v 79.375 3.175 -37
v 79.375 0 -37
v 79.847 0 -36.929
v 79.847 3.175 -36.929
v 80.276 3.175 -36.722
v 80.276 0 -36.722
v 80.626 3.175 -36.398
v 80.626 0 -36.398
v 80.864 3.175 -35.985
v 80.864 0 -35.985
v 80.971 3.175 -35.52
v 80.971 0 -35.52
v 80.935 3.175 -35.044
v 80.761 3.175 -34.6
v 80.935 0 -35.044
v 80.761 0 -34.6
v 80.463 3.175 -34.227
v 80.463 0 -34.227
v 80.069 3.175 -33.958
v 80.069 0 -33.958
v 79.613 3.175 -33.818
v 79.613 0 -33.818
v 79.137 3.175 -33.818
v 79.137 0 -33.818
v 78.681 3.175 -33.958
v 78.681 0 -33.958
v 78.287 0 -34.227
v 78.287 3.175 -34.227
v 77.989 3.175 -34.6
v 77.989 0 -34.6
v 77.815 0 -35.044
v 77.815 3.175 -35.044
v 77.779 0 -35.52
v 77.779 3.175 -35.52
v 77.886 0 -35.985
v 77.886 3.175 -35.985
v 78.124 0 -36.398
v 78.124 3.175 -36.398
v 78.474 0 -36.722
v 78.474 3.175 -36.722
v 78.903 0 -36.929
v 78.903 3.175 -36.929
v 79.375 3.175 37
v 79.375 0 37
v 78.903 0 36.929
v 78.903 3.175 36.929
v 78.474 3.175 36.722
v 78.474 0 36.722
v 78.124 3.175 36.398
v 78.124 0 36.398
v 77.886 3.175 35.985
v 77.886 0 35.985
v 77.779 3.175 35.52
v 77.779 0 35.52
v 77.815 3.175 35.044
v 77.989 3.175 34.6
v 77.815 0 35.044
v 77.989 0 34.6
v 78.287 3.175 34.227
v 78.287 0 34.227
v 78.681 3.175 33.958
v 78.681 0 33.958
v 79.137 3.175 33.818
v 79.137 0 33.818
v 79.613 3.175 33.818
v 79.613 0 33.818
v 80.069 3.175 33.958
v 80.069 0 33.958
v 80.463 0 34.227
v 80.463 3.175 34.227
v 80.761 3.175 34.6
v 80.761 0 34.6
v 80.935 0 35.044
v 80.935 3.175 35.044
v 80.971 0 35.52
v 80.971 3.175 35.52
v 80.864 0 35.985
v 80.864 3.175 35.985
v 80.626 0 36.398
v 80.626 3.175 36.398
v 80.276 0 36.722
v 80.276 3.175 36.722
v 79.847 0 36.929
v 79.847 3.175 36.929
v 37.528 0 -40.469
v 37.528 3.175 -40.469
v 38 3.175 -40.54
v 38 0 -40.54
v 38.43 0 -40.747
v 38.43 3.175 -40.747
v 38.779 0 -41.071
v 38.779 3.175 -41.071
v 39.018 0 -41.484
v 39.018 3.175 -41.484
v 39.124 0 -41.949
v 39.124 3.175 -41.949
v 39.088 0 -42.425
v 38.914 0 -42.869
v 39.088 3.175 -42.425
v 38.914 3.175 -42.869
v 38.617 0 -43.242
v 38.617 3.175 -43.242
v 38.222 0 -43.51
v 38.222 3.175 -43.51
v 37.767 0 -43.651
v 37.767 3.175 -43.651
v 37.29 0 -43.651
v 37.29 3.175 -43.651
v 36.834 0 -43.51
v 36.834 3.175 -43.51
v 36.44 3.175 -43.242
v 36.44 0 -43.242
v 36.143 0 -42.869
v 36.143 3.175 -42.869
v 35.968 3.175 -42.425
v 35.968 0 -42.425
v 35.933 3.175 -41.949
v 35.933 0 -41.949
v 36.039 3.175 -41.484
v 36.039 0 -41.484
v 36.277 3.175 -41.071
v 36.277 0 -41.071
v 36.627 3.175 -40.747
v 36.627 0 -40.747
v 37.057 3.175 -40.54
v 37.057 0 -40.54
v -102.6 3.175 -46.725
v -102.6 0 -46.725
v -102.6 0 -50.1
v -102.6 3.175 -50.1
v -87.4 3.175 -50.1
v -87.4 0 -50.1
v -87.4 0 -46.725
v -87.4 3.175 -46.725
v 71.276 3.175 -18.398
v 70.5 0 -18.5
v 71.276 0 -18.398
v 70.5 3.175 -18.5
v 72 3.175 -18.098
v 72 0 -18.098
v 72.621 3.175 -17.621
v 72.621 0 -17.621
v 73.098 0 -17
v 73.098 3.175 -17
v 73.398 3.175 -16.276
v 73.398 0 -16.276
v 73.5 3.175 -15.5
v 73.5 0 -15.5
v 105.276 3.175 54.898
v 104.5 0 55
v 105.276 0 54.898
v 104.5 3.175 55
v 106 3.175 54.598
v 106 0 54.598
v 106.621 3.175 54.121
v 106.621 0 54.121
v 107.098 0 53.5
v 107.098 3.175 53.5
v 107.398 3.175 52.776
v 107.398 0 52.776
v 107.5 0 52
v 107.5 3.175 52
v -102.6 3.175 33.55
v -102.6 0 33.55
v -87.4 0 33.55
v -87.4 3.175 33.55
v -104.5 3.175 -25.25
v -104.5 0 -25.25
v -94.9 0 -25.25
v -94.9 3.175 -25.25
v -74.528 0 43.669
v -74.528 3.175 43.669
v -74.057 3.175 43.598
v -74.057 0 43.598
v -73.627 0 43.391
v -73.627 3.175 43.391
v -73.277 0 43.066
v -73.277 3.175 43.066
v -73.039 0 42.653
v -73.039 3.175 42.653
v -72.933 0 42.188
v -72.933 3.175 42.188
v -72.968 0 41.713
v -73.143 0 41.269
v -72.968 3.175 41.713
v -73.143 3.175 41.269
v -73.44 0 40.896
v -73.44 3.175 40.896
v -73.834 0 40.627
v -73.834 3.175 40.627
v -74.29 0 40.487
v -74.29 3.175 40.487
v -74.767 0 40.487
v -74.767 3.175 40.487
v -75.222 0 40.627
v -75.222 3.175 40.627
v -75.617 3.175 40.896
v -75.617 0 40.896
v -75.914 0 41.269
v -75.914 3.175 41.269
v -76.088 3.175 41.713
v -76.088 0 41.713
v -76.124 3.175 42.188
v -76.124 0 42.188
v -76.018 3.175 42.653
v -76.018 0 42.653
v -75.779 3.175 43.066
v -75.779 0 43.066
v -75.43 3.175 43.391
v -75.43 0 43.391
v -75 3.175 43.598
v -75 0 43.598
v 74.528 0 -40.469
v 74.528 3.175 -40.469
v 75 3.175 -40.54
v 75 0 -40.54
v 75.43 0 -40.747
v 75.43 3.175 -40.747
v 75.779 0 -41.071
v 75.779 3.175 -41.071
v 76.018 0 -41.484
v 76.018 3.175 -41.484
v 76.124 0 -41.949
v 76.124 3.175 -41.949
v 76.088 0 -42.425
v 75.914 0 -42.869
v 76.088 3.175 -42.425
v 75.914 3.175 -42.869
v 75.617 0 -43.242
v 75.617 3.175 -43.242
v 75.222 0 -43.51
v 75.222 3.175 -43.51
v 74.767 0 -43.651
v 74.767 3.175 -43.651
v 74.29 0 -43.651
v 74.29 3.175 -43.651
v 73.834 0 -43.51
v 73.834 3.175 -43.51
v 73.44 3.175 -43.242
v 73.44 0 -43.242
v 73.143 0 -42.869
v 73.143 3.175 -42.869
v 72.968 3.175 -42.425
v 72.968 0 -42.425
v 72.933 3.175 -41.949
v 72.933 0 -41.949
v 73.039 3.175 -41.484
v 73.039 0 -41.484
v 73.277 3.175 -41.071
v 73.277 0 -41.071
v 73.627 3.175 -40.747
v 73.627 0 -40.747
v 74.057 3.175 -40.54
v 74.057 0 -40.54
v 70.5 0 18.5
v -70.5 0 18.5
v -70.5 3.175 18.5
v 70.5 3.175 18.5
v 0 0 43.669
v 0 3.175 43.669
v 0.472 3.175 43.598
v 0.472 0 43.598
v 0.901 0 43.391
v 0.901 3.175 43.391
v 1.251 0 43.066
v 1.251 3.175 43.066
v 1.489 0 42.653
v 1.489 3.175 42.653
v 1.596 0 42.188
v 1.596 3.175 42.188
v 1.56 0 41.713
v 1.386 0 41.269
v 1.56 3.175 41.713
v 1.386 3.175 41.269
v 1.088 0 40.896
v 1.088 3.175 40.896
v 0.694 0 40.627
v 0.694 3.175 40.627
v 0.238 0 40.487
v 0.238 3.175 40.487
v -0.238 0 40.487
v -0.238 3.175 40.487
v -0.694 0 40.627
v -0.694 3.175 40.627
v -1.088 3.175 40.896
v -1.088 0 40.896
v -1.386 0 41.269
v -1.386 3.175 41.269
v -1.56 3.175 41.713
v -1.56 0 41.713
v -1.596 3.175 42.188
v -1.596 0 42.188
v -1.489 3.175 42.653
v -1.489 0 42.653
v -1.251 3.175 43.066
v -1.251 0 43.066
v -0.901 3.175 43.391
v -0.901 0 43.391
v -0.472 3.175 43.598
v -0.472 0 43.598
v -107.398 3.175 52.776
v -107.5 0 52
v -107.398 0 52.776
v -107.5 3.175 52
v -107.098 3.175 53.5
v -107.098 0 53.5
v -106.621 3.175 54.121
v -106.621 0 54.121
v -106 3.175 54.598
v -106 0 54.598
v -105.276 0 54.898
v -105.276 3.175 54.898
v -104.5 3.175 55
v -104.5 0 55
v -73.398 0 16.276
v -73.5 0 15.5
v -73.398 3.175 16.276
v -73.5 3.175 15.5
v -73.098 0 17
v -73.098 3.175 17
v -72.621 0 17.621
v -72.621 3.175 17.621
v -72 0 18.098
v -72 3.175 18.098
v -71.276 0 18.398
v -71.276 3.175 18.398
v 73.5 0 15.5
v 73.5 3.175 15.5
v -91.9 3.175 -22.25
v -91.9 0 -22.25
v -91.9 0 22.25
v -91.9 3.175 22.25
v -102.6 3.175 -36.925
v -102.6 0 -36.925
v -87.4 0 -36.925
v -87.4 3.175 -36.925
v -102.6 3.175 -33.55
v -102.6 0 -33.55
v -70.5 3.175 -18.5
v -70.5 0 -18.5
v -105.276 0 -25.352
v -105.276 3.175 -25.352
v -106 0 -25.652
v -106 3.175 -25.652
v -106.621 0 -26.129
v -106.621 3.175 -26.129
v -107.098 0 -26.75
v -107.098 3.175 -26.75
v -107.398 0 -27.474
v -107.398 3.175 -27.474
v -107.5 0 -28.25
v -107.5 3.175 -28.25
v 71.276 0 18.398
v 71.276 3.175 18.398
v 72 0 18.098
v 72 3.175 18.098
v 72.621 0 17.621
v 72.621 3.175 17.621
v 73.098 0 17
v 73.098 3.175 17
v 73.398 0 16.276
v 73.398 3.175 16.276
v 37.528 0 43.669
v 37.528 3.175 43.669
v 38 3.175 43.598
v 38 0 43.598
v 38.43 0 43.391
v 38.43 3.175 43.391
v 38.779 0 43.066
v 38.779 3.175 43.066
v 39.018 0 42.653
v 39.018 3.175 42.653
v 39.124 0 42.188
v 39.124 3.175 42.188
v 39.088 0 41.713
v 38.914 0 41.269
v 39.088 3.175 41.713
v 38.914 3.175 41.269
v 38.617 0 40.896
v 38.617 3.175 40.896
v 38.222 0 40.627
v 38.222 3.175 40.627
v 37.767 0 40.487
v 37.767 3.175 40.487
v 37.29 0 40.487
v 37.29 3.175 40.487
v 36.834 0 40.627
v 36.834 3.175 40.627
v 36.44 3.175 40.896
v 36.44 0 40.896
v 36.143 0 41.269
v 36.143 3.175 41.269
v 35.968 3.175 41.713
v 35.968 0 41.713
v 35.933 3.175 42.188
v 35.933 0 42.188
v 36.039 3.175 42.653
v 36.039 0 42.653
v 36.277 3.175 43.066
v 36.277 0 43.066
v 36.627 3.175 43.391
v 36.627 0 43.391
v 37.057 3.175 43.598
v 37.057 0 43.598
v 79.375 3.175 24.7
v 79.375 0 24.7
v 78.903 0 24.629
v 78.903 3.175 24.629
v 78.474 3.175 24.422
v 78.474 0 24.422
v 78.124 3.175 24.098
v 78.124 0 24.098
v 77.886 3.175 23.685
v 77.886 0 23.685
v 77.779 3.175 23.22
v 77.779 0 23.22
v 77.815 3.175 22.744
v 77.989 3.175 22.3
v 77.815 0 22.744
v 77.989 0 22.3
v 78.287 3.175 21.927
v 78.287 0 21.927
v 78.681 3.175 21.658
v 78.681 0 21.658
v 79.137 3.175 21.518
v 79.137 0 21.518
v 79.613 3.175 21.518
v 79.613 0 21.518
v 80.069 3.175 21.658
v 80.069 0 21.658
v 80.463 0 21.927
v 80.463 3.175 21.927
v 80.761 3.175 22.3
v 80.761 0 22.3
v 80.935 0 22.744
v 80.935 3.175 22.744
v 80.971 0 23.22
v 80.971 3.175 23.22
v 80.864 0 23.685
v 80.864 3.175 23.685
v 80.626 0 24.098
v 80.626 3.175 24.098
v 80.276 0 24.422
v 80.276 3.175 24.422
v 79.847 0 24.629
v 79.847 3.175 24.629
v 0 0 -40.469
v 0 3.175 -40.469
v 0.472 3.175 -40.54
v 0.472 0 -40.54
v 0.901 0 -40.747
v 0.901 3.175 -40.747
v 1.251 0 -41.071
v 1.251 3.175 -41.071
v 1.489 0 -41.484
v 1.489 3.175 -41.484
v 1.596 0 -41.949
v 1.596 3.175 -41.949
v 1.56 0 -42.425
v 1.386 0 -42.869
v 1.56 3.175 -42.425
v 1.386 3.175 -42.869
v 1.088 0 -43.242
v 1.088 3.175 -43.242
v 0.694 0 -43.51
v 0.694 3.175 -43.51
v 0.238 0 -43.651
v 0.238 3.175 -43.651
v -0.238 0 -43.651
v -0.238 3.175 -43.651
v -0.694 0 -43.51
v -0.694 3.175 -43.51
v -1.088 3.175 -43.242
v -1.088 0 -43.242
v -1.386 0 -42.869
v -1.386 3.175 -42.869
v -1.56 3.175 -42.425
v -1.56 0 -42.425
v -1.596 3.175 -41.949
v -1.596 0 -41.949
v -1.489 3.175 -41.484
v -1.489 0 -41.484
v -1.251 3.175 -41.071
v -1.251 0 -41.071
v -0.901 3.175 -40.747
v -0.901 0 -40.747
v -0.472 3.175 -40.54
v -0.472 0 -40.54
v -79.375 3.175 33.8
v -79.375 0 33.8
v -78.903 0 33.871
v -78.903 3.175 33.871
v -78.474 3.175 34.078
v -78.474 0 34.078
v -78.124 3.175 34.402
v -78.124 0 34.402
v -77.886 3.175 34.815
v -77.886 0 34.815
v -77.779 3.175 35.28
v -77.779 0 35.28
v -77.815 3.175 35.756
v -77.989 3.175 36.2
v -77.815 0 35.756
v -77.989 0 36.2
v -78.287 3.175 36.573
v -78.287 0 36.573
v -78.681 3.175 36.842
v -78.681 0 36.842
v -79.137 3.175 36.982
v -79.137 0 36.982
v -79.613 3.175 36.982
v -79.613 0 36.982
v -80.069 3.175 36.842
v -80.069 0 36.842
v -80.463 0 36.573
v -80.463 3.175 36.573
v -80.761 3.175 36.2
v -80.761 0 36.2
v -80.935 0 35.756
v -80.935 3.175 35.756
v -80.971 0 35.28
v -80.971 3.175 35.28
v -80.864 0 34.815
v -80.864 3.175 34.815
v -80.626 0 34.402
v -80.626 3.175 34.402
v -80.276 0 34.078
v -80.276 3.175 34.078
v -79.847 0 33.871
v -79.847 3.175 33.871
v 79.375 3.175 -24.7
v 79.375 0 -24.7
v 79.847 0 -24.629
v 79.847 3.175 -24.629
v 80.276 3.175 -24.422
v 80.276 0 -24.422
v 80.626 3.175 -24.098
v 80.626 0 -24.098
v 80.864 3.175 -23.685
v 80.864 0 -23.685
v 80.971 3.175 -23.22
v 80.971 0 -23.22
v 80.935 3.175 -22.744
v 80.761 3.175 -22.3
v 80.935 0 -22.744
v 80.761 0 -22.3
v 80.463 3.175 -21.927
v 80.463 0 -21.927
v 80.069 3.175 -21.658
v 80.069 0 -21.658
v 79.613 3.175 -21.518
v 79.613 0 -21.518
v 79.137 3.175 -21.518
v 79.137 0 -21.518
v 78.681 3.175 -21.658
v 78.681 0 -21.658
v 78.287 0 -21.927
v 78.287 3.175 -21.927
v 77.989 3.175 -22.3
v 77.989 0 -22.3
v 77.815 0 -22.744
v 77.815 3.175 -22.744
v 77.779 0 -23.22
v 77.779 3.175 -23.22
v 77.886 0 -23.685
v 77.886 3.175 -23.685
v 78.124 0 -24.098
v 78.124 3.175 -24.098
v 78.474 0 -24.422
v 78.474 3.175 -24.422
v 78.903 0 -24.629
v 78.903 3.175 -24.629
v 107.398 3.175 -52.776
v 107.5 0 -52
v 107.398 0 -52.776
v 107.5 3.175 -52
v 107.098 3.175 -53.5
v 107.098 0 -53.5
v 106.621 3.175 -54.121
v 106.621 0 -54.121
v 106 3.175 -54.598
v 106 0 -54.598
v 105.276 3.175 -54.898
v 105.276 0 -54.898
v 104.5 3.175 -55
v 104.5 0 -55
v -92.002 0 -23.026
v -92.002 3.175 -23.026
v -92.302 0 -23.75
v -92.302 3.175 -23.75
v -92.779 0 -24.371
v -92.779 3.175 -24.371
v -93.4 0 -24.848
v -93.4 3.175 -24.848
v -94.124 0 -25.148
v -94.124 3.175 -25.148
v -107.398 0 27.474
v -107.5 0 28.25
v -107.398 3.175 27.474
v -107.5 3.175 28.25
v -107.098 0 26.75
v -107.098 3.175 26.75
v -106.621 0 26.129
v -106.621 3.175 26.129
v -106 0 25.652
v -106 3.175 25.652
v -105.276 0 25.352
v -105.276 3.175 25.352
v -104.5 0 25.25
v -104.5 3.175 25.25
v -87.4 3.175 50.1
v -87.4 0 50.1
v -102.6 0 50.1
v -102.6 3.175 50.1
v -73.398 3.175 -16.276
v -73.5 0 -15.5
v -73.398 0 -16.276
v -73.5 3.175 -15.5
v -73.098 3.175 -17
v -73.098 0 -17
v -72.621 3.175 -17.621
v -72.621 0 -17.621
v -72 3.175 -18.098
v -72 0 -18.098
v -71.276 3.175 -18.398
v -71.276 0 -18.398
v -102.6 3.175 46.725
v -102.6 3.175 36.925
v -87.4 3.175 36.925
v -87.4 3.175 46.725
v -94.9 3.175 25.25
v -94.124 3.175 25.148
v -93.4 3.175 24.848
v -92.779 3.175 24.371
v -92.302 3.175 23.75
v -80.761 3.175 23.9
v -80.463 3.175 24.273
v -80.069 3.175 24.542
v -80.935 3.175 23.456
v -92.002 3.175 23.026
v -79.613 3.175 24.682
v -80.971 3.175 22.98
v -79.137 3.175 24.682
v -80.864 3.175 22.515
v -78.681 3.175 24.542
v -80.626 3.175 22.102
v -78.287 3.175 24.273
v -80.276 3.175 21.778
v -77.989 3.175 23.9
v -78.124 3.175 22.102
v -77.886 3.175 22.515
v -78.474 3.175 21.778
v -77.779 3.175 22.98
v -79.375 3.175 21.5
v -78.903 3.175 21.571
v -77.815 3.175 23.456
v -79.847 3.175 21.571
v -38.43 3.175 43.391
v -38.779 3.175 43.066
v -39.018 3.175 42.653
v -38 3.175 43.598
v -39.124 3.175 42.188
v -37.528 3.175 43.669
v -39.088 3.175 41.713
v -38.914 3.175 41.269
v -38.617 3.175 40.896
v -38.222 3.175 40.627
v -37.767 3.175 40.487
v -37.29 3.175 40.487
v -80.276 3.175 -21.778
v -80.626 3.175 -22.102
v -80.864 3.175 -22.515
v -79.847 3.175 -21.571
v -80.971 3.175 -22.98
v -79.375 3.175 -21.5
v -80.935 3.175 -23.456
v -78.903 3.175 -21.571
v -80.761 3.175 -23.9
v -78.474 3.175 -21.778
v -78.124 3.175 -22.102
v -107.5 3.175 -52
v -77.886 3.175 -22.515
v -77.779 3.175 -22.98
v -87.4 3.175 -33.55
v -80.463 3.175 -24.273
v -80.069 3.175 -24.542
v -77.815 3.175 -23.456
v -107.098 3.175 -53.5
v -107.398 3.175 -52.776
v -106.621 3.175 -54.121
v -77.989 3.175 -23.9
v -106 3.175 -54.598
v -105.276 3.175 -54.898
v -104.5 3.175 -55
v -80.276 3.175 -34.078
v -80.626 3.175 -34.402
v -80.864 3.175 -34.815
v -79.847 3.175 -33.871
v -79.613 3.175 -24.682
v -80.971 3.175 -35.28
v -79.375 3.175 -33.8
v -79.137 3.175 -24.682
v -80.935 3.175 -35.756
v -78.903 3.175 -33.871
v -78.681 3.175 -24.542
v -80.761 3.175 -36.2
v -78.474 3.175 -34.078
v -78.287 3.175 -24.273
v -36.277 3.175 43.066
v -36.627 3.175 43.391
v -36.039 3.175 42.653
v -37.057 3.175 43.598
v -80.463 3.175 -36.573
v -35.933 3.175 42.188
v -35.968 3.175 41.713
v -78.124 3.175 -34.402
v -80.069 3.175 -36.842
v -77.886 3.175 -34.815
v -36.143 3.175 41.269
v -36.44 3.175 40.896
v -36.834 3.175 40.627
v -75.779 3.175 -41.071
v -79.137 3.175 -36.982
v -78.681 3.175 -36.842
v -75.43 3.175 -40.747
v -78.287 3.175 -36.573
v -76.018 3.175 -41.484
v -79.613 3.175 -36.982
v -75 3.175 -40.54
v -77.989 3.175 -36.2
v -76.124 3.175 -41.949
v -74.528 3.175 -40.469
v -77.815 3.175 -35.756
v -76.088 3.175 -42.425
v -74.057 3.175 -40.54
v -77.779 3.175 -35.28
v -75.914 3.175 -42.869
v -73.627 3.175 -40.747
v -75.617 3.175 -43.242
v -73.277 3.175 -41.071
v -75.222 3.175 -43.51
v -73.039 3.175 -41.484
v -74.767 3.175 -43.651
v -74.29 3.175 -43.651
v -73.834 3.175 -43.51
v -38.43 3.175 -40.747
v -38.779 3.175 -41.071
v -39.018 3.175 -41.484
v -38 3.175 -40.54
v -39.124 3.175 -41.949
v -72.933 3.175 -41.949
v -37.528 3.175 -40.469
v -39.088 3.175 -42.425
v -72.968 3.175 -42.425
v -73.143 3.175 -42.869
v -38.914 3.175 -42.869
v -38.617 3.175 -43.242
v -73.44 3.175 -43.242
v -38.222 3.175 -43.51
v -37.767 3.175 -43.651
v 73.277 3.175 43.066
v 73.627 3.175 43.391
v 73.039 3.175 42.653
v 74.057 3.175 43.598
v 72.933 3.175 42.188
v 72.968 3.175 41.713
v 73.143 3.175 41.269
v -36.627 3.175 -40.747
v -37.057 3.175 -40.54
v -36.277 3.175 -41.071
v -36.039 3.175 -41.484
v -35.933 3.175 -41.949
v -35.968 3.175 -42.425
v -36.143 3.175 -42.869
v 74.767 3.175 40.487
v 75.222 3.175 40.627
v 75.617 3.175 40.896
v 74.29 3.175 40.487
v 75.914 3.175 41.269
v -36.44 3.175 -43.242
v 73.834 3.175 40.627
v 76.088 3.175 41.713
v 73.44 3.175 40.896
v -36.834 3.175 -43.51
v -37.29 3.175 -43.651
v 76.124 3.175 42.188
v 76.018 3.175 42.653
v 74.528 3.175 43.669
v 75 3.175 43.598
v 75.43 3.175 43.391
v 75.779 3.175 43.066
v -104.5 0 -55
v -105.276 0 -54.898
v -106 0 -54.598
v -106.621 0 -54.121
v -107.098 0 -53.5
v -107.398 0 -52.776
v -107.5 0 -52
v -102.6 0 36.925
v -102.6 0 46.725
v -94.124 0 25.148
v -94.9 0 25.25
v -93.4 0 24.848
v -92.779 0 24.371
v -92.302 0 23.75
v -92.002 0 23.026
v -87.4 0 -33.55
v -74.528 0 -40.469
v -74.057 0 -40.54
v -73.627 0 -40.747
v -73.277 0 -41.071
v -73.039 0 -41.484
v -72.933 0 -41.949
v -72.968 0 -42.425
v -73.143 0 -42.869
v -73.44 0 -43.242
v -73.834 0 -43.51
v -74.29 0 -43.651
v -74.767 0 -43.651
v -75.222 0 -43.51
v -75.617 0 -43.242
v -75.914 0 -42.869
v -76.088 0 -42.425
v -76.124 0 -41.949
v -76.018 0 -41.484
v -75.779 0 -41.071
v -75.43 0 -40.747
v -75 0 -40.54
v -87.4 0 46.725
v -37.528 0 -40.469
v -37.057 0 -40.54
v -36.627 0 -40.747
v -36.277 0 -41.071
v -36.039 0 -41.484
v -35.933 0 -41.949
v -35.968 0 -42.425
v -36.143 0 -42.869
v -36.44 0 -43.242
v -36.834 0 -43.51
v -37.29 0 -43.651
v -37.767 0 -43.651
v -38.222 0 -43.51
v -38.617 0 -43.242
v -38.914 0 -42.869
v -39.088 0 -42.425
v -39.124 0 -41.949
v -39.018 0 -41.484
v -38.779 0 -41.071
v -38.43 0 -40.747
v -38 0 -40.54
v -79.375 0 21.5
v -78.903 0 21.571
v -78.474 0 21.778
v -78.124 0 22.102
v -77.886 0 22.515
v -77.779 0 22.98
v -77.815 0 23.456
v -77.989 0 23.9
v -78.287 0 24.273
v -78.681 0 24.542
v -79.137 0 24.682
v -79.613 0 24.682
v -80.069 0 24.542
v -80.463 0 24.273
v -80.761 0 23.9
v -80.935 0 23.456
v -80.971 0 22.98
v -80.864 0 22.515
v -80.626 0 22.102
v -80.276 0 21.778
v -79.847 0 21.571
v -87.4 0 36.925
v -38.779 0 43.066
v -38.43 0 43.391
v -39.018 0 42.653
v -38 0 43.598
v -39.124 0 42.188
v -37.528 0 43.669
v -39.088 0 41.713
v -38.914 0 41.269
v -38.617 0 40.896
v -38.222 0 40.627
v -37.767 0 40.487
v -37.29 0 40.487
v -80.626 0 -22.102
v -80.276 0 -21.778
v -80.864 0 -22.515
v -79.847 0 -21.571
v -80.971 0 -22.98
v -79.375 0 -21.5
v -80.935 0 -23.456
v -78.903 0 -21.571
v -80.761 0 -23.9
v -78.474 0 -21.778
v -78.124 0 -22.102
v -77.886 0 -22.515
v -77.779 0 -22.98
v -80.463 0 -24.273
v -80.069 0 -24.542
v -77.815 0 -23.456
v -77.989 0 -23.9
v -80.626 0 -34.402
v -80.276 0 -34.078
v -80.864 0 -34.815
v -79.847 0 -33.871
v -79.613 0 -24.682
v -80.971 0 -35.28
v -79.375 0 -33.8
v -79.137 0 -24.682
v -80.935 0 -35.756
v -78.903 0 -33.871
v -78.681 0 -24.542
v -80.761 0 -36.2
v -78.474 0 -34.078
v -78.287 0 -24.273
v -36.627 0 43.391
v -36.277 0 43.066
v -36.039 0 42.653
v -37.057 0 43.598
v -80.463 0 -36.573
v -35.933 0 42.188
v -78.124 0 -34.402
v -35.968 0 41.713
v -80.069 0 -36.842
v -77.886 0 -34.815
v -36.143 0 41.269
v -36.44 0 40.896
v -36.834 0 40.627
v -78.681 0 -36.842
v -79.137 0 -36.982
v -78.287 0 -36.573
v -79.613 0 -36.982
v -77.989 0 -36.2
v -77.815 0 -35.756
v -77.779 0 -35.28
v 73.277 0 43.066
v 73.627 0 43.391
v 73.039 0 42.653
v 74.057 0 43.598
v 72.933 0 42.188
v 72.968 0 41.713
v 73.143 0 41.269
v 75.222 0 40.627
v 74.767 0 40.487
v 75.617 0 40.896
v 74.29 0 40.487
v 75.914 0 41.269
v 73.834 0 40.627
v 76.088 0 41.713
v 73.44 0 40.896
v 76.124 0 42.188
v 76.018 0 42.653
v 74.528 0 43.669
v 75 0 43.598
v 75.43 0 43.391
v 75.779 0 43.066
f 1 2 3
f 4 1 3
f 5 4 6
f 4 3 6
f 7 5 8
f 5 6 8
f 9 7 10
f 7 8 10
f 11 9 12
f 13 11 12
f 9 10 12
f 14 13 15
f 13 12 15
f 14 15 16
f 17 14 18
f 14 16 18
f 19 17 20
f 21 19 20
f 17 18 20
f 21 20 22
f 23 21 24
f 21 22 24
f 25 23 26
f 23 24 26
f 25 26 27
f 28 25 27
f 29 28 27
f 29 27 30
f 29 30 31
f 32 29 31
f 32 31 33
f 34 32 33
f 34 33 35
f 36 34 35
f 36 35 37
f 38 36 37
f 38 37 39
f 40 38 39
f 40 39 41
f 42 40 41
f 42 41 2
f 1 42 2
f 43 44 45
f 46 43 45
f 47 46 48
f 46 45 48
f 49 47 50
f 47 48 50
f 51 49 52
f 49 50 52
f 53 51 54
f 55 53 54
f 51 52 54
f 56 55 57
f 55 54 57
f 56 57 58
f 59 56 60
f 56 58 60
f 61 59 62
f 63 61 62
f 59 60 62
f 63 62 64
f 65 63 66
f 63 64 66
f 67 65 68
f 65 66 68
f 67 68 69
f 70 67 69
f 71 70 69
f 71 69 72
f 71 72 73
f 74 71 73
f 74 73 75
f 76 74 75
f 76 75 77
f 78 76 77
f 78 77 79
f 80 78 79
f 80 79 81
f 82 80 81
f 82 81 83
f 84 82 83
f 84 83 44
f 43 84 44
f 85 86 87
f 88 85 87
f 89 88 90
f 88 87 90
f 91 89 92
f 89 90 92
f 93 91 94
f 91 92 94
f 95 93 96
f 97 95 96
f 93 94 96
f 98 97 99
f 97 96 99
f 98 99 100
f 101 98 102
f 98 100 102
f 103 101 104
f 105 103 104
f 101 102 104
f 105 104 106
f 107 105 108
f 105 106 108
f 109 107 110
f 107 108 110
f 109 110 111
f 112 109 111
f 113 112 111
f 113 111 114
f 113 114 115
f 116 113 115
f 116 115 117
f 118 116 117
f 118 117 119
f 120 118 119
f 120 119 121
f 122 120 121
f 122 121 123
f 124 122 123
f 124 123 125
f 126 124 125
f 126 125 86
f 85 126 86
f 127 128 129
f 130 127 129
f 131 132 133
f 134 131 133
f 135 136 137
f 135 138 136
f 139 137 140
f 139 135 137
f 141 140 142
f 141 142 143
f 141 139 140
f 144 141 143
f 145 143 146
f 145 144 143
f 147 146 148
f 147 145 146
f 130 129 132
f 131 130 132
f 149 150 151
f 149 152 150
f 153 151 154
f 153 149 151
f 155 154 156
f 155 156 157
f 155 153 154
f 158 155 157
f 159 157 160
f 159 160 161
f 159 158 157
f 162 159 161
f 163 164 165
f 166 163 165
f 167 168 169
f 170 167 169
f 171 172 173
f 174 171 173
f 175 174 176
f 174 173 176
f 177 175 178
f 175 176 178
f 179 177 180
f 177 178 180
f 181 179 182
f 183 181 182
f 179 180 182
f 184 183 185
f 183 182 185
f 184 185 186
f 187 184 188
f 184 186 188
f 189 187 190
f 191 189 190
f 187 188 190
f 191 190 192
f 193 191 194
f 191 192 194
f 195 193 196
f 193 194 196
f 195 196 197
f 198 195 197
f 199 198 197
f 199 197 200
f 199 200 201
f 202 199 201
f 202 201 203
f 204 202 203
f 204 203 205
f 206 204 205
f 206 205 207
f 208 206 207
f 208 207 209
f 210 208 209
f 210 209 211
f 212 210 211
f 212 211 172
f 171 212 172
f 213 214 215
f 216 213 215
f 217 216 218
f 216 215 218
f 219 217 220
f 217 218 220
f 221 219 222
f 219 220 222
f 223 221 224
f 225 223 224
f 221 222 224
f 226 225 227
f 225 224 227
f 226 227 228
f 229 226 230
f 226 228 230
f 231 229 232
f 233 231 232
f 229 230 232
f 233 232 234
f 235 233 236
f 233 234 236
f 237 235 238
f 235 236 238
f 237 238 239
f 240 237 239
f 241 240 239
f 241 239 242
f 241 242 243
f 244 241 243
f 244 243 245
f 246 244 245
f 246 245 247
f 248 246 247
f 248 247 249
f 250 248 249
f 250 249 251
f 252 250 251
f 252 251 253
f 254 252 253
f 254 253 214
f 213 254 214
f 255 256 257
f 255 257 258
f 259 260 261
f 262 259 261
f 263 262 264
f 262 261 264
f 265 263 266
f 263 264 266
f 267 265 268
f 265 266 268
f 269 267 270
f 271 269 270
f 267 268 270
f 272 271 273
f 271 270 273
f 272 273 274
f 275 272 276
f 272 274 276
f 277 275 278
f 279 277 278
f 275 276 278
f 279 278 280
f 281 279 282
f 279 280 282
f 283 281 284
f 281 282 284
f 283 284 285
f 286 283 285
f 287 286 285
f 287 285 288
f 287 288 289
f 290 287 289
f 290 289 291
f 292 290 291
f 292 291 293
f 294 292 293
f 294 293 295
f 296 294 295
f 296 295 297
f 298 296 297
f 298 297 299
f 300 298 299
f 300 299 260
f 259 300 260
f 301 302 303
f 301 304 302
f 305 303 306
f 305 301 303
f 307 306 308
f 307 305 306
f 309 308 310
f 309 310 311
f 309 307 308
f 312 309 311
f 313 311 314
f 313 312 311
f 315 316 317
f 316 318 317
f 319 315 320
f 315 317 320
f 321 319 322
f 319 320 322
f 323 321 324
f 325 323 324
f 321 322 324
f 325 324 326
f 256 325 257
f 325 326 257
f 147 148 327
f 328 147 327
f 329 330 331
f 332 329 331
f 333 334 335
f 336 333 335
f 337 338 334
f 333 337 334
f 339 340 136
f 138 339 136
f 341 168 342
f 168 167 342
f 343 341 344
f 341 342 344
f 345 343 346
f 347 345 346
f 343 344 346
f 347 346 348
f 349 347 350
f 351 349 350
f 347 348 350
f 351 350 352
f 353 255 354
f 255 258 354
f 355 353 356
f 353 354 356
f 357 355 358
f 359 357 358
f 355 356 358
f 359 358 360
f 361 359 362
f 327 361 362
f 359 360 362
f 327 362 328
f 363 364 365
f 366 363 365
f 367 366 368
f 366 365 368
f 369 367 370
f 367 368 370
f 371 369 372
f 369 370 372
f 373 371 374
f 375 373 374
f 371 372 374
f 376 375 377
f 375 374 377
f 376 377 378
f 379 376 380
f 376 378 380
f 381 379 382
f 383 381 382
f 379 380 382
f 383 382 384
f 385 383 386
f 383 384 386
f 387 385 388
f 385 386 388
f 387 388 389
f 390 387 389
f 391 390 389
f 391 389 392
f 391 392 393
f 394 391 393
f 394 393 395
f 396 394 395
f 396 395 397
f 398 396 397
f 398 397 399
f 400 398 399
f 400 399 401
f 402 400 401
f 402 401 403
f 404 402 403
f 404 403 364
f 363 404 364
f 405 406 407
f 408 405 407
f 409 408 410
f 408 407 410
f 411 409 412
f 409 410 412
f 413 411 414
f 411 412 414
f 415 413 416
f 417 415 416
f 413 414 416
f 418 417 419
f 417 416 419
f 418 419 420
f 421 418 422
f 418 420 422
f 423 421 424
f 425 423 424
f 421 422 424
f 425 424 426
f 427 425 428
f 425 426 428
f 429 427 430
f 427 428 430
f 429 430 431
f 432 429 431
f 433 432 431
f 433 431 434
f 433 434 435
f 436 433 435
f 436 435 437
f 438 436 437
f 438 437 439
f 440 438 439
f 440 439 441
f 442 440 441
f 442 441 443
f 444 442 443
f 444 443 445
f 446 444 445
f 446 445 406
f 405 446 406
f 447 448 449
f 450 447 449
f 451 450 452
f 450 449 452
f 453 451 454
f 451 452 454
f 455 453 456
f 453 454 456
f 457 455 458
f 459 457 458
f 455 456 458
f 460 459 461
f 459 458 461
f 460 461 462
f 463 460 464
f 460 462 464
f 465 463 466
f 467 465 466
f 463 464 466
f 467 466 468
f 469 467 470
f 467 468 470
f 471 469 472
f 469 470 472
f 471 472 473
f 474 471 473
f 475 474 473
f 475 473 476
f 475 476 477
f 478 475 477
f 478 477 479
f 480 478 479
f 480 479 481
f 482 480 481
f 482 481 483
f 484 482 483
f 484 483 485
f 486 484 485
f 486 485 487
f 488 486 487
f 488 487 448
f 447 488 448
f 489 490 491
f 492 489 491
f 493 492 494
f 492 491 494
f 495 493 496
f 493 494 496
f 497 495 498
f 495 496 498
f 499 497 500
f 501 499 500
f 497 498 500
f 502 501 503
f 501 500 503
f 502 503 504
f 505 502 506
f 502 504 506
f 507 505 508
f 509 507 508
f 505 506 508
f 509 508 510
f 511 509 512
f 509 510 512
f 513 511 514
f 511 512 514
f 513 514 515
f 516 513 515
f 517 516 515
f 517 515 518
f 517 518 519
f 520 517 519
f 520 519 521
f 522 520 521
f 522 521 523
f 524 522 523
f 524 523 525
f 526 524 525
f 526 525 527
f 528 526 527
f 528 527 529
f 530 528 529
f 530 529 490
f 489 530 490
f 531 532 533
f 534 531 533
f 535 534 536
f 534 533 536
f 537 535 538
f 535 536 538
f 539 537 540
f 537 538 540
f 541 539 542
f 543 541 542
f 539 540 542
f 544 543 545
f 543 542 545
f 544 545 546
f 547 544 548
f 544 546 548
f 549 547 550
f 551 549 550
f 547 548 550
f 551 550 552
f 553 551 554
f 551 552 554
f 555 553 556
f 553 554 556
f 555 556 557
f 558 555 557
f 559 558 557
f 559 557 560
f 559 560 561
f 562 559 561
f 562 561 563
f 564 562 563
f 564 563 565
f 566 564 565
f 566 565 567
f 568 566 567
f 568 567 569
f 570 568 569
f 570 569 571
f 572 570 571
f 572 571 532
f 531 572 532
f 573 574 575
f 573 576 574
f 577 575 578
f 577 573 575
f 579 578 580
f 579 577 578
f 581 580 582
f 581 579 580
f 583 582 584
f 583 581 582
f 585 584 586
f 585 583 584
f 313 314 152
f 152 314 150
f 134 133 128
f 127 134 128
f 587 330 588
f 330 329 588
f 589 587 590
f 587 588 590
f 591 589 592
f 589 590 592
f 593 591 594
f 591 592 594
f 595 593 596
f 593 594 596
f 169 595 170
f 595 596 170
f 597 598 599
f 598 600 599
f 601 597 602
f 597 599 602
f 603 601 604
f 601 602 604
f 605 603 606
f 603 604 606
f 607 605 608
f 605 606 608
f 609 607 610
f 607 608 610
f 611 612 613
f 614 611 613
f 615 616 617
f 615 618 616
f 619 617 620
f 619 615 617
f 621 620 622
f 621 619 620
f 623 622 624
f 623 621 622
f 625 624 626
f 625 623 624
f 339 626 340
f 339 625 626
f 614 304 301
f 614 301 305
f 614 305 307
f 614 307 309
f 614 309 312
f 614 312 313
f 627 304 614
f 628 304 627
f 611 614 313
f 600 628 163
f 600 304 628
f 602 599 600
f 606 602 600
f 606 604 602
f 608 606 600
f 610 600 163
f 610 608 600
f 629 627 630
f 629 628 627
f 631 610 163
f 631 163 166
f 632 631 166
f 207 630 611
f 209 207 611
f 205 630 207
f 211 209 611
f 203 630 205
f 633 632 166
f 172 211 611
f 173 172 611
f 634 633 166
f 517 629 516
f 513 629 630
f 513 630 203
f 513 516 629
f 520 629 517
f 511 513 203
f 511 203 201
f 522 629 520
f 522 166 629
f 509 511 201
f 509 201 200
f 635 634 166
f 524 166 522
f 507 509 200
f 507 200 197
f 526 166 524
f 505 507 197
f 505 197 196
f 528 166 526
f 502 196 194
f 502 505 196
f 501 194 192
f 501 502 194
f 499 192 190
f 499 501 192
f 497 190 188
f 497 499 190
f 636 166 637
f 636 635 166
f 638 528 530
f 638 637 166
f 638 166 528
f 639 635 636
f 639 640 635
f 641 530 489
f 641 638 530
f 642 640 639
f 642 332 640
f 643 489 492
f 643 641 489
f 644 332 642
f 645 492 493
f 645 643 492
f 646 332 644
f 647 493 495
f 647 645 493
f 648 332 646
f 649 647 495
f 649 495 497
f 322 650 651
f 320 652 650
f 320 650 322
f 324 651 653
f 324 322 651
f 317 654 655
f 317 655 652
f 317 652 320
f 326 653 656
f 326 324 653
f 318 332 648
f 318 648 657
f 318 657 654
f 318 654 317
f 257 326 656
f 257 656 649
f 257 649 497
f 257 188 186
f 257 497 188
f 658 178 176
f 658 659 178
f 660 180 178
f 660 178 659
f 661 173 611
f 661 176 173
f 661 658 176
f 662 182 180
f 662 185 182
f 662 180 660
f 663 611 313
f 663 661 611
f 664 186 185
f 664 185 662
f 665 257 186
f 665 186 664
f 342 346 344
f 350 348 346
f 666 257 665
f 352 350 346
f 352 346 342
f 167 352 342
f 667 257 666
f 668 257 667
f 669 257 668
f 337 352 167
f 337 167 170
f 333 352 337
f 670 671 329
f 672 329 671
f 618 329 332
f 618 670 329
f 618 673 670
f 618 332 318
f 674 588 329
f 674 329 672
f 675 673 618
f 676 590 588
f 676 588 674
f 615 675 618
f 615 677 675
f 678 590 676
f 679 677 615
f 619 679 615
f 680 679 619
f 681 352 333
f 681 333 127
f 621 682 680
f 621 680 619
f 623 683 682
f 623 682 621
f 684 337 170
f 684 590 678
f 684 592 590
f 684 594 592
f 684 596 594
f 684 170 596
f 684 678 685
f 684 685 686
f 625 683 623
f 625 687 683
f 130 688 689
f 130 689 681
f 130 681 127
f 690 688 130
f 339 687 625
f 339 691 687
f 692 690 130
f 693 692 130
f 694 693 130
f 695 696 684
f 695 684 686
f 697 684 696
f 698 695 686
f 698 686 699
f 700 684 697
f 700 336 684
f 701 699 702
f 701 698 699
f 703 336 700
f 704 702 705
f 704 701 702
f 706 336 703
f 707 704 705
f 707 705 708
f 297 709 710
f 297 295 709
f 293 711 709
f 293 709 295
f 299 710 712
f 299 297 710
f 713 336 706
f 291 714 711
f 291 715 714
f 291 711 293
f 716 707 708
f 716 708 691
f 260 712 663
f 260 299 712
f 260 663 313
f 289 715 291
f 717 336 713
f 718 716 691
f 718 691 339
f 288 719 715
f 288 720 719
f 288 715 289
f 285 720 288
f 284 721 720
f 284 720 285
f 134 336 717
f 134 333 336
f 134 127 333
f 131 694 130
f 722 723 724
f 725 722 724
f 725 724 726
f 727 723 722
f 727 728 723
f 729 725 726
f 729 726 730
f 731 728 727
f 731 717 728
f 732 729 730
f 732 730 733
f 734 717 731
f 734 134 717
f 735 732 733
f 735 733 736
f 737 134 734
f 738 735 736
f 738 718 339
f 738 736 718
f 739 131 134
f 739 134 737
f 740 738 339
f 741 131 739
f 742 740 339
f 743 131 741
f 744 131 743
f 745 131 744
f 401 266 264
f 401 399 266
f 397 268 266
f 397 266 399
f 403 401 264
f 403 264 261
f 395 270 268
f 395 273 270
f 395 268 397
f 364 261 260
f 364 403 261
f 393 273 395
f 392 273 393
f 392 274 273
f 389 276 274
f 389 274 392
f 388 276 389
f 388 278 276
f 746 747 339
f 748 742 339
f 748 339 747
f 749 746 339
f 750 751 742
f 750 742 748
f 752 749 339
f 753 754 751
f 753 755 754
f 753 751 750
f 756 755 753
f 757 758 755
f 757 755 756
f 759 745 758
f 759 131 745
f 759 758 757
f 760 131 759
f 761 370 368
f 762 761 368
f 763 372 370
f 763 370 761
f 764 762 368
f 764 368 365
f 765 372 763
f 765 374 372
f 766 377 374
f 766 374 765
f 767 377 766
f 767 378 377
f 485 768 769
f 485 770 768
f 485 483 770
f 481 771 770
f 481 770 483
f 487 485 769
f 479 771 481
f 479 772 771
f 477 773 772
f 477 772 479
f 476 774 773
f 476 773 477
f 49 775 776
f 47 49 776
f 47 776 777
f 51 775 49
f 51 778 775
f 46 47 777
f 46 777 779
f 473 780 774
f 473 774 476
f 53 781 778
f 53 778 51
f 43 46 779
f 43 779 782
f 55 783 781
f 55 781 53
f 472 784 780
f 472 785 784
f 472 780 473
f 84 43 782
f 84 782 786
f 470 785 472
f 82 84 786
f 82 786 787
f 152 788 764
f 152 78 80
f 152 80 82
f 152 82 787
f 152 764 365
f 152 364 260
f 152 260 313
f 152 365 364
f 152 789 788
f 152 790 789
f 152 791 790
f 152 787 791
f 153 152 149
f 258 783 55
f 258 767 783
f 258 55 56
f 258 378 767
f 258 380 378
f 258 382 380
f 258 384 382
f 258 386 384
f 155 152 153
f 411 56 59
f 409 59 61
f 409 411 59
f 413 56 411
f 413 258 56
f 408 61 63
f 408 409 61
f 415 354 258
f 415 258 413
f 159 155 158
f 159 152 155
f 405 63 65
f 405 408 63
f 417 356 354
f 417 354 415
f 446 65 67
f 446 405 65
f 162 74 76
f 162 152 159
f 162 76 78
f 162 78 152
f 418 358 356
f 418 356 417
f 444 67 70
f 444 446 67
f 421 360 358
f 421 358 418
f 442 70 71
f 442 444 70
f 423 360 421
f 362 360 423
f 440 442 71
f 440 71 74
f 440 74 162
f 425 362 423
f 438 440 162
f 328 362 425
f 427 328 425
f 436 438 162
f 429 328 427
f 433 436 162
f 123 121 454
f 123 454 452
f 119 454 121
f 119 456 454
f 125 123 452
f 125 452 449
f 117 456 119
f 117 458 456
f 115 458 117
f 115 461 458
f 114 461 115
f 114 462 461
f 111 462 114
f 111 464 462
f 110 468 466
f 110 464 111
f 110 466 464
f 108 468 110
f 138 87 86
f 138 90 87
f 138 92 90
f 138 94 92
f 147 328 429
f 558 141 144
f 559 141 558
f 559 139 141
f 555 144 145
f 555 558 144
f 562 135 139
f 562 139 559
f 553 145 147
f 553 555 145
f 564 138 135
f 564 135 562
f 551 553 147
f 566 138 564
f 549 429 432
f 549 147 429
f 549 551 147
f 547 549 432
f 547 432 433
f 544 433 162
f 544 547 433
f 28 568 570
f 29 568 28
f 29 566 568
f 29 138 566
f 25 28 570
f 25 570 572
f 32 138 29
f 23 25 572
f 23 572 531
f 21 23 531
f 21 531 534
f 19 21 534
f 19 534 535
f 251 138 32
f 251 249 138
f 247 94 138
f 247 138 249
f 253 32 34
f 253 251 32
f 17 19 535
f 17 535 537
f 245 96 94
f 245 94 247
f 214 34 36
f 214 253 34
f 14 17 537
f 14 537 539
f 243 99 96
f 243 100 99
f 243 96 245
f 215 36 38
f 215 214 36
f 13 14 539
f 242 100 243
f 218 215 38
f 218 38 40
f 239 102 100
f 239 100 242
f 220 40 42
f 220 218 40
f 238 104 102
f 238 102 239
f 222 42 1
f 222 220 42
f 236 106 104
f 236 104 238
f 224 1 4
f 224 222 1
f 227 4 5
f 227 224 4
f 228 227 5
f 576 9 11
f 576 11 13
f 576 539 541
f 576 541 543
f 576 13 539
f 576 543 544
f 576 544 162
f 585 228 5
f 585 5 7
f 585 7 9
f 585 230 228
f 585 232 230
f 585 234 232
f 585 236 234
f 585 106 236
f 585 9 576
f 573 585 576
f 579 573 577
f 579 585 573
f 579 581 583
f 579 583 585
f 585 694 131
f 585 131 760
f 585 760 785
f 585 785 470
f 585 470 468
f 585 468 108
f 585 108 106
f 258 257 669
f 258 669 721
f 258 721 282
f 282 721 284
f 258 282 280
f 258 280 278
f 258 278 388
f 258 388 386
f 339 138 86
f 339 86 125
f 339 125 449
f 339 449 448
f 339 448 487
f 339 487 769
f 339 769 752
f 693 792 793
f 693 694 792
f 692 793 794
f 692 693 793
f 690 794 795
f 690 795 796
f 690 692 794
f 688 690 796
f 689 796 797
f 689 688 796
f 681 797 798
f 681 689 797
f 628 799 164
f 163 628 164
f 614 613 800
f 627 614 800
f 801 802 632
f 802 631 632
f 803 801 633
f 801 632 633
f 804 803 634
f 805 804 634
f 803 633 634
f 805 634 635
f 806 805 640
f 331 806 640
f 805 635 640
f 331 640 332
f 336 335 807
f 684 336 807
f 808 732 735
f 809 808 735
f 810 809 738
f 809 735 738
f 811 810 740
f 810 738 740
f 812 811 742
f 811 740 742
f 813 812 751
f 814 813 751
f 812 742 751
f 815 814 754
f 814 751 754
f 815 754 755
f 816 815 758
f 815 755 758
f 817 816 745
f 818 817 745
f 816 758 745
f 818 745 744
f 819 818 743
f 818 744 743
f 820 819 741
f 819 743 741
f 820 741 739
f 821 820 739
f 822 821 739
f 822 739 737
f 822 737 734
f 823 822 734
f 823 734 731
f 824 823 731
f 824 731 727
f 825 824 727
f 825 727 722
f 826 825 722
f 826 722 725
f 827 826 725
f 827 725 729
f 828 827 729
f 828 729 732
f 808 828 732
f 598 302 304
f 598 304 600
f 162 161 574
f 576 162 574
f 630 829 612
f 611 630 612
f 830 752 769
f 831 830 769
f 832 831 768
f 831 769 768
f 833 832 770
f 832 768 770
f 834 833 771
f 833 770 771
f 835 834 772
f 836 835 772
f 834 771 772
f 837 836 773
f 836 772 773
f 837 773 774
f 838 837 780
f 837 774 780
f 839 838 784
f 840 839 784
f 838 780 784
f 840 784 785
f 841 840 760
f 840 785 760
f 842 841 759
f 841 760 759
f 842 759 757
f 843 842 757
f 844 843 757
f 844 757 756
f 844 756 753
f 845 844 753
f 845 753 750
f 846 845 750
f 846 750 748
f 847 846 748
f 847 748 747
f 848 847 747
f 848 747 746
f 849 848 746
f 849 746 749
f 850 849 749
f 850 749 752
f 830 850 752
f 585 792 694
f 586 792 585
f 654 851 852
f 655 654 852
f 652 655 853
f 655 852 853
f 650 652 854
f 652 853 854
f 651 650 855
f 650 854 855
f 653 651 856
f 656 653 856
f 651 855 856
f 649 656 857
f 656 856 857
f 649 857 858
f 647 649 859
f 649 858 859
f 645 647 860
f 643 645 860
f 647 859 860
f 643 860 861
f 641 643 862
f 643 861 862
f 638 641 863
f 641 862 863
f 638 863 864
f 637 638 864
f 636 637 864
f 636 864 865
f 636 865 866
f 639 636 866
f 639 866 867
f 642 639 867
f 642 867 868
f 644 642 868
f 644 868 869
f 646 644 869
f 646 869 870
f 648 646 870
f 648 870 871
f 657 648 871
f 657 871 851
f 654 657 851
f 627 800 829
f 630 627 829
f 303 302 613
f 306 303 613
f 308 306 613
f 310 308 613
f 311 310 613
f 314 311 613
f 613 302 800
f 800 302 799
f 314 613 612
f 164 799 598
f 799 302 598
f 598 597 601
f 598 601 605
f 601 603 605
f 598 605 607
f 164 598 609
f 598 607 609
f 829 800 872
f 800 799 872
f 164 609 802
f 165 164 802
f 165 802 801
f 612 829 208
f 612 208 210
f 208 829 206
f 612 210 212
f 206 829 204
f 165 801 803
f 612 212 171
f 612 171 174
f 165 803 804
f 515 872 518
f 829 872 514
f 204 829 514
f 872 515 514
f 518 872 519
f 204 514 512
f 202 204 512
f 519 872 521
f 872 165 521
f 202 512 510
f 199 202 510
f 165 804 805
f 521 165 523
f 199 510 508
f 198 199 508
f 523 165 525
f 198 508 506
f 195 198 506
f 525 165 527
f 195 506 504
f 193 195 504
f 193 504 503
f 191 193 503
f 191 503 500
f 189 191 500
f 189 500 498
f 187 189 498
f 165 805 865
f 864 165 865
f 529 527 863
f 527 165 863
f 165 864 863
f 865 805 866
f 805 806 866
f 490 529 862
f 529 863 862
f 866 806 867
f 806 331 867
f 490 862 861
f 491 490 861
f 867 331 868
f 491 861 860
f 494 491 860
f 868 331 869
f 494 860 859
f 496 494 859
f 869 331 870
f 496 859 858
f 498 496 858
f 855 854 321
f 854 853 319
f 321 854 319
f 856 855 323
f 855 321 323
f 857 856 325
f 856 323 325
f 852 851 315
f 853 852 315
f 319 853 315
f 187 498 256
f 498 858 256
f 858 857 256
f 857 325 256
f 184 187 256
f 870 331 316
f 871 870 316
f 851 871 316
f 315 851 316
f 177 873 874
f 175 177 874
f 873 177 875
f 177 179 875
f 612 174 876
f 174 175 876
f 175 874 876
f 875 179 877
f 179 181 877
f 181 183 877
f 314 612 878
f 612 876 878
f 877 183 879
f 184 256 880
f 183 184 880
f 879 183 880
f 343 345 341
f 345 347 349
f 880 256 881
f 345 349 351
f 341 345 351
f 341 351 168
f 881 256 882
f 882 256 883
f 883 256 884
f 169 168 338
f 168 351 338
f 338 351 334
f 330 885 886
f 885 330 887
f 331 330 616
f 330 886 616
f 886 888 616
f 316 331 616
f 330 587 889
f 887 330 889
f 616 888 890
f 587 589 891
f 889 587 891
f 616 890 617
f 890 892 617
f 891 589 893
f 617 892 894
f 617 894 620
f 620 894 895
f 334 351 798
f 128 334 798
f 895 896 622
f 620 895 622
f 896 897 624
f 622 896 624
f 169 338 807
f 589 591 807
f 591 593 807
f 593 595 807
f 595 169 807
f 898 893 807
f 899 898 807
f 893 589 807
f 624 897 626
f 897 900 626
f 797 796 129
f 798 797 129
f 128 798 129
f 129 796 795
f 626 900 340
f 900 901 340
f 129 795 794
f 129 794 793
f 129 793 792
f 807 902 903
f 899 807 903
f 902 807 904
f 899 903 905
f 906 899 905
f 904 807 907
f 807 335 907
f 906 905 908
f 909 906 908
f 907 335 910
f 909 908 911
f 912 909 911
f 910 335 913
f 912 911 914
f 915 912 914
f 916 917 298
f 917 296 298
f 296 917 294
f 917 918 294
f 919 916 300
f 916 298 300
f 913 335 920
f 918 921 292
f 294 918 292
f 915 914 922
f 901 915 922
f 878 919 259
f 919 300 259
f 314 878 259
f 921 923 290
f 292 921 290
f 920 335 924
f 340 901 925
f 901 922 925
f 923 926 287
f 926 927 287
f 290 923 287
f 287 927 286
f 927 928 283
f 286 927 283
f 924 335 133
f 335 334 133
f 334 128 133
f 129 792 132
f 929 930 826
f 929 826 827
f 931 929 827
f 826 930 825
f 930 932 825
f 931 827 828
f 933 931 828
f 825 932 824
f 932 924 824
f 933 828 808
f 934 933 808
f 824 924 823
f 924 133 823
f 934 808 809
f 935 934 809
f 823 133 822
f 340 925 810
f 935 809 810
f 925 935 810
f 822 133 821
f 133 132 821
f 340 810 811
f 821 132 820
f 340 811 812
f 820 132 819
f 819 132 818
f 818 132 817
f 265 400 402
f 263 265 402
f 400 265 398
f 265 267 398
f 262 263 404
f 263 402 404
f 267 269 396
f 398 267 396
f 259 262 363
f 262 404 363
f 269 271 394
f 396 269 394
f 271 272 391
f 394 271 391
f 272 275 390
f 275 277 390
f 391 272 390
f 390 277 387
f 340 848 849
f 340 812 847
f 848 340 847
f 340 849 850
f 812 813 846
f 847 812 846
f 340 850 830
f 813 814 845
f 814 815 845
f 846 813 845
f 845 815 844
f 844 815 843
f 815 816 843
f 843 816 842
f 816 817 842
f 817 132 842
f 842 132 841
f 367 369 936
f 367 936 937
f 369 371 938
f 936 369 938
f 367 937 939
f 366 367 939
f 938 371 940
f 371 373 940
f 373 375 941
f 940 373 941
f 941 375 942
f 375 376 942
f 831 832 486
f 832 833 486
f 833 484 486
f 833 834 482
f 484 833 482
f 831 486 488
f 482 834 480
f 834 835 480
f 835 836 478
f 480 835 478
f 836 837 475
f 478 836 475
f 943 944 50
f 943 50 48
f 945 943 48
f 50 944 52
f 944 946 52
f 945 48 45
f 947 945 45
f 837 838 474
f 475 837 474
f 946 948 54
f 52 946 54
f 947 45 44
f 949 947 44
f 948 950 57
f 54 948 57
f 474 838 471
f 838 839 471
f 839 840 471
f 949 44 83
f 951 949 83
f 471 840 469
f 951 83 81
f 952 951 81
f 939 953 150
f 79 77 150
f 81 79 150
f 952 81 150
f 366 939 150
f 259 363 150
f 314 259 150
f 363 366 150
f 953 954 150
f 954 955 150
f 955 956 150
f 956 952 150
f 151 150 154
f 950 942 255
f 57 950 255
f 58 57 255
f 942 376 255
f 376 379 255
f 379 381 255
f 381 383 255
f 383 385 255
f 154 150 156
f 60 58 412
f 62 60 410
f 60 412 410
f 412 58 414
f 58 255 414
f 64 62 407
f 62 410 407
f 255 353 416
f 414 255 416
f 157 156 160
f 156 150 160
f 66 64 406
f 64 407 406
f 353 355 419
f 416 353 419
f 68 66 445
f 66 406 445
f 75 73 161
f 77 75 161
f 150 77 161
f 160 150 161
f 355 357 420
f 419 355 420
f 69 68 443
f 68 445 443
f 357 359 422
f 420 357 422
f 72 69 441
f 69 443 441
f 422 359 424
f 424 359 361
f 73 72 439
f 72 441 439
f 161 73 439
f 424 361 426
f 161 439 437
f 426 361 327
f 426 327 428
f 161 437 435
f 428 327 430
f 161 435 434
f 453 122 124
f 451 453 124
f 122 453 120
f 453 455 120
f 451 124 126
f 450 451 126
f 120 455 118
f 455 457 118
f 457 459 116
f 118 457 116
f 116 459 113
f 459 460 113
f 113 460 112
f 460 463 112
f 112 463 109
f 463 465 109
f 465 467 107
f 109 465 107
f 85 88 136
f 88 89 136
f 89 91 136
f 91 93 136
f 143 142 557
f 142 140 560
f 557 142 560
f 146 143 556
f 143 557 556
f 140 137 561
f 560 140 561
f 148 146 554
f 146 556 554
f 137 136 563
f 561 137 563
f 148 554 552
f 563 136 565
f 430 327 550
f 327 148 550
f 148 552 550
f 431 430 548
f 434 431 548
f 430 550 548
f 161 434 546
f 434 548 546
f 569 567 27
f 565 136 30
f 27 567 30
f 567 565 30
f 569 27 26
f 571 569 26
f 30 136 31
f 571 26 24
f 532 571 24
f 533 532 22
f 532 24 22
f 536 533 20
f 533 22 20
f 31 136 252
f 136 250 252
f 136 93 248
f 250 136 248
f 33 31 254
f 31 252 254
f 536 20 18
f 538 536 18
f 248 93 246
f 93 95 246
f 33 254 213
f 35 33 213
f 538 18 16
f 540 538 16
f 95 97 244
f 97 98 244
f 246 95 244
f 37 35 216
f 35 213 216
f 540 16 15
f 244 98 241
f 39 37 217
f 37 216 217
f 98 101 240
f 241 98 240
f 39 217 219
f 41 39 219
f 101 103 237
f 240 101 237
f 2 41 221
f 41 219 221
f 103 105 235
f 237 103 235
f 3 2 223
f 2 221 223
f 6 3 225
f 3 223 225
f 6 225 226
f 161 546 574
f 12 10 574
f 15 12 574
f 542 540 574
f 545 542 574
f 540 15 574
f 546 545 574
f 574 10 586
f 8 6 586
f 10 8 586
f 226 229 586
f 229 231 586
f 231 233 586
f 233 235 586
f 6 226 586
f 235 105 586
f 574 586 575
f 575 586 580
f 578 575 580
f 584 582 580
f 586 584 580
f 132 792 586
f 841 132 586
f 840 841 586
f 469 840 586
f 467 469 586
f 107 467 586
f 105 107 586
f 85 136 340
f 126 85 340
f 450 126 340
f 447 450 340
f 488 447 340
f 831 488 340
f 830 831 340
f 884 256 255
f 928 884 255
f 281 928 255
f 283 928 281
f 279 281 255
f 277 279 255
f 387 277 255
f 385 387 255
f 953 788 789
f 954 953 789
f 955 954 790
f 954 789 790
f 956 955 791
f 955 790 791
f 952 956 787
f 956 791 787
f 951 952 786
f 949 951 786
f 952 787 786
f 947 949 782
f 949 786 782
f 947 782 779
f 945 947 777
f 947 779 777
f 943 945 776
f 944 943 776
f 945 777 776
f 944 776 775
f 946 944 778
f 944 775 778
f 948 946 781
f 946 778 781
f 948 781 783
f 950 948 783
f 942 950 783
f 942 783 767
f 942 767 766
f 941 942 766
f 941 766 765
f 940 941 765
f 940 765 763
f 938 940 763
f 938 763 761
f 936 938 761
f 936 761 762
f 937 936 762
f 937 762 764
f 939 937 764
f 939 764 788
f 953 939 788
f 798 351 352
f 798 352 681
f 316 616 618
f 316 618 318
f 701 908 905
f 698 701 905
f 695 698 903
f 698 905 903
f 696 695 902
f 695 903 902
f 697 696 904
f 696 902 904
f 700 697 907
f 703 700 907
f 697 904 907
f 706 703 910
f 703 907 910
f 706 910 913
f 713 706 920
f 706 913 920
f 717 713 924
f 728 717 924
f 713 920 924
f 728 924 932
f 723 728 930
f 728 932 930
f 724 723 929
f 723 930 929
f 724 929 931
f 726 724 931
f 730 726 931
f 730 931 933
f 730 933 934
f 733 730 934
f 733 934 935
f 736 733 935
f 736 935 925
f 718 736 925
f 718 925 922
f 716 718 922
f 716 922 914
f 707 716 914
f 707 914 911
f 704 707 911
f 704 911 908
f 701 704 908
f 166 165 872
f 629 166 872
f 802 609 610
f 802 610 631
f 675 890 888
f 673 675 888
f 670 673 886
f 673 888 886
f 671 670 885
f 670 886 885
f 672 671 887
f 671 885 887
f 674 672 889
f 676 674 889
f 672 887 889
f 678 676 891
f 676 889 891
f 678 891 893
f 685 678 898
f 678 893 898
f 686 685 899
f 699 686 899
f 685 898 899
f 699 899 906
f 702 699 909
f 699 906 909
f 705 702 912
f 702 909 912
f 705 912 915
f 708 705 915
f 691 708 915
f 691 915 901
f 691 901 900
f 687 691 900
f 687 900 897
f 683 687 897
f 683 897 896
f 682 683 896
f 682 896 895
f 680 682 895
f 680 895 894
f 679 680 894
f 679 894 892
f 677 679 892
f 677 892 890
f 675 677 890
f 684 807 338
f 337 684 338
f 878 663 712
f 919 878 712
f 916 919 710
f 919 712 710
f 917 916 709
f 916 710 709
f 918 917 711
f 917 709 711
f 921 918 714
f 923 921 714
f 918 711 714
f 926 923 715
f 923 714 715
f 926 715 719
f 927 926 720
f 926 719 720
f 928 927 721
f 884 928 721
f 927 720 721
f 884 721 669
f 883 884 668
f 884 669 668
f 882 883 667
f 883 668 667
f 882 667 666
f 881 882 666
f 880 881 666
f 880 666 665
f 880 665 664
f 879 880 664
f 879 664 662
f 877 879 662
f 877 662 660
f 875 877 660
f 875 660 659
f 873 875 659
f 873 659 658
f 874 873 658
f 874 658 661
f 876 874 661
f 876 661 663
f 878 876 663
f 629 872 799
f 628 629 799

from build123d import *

# Parameters (mm, degrees)
SKETCH1_W           = 215
SKETCH1_H           = 110
BOSS_EXTRUDE1_DEPTH = 3.175
SKETCH2_W           = 147
SKETCH2_H           = 37
CUT_EXTRUDE1_DEPTH  = 121.79458028
SKETCH3_W           = 15.6
SKETCH3_H           = 50.5
CUT_EXTRUDE2_DEPTH  = 121.79458028
SKETCH5_R           = 1.6
CUT_EXTRUDE4_DEPTH  = 121.79458028
SKETCH6_R           = 1.6
CUT_EXTRUDE5_DEPTH  = 121.79458028
FILLET1_R           = 3
CUT_EXTRUDE6_DEPTH  = 121.79458028


with BuildPart() as part:
    # Sketch1 → Boss-Extrude1 (new body)
    with BuildSketch(Plane(origin=(0, 0, 0), x_dir=(1, 0, 0), z_dir=(0, 1, 0))):
        Rectangle(SKETCH1_W, SKETCH1_H)
    extrude(amount=BOSS_EXTRUDE1_DEPTH)

    # Sketch2 → Cut-Extrude1 (cut, through all)
    with BuildSketch(Plane.XZ):
        Rectangle(SKETCH2_W, SKETCH2_H)
    extrude(amount=-CUT_EXTRUDE1_DEPTH, mode=Mode.SUBTRACT)

    # Sketch3 → Cut-Extrude2 (cut, through all)
    with BuildSketch(Plane.XZ):
        with Locations((-99.7, 0)):
            Rectangle(SKETCH3_W, SKETCH3_H)
    extrude(amount=-CUT_EXTRUDE2_DEPTH, mode=Mode.SUBTRACT)

    # Sketch5 → Cut-Extrude4 (cut, through all)
    with BuildSketch(Plane.XZ):
        with Locations(Location((-79.375, 23.1, 0), (0, 0, 270))):
            Circle(SKETCH5_R)
        with Locations(Location((-79.375, -23.1, 0), (0, 0, 90))):
            Circle(SKETCH5_R)
        with Locations(Location((79.375, -23.1, 0), (0, 0, 270))):
            Circle(SKETCH5_R)
        with Locations(Location((79.375, 23.1, 0), (0, 0, 90))):
            Circle(SKETCH5_R)
        with Locations(Location((-79.375, 35.4, 0), (0, 0, 270))):
            Circle(SKETCH5_R)
        with Locations(Location((-79.375, -35.4, 0), (0, 0, 90))):
            Circle(SKETCH5_R)
        with Locations(Location((79.375, 35.4, 0), (0, 0, 90))):
            Circle(SKETCH5_R)
        with Locations(Location((79.375, -35.4, 0), (0, 0, 270))):
            Circle(SKETCH5_R)
    extrude(amount=-CUT_EXTRUDE4_DEPTH, mode=Mode.SUBTRACT)

    # Sketch6 → Cut-Extrude5 (cut, through all)
    with BuildSketch(Plane(origin=(0, 3.175, 0), x_dir=(1, 0, 0), z_dir=(0, 1, 0))):
        with Locations(Location((37.528255169, 42.068885296, 0), (0, 0, 270))):
            Circle(SKETCH6_R)
        with Locations(Location((0, 42.068885296, 0), (0, 0, 270))):
            Circle(SKETCH6_R)
        with Locations(Location((-37.528255169, 42.068885296, 0), (0, 0, 270))):
            Circle(SKETCH6_R)
        with Locations(Location((-74.528255169, 42.068885296, 0), (0, 0, 270))):
            Circle(SKETCH6_R)
        with Locations(Location((74.528255169, -42.068885296, 0), (0, 0, 270))):
            Circle(SKETCH6_R)
        with Locations(Location((37.528255169, -42.068885296, 0), (0, 0, 270))):
            Circle(SKETCH6_R)
        with Locations(Location((0, -42.068885296, 0), (0, 0, 270))):
            Circle(SKETCH6_R)
        with Locations(Location((-37.528255169, -42.068885296, 0), (0, 0, 270))):
            Circle(SKETCH6_R)
        with Locations(Location((-74.528255169, -42.068885296, 0), (0, 0, 270))):
            Circle(SKETCH6_R)
        with Locations(Location((74.528255169, 42.068885296, 0), (0, 0, 270))):
            Circle(SKETCH6_R)
    extrude(amount=-CUT_EXTRUDE5_DEPTH, mode=Mode.SUBTRACT)

    # Fillet1
    fillet1_edges = [part.edges().sort_by_distance(p)[0] for p in [
        (-73.5, 1.5875, -18.5),
        (-73.5, 1.5875, 18.5),
        (73.5, 1.5875, 18.5),
        (73.5, 1.5875, -18.5),
        (-107.5, 1.5875, -25.25),
        (-107.5, 1.5875, 25.25),
        (-91.9, 1.5875, 25.25),
        (-91.9, 1.5875, -25.25),
        (-107.5, 1.5875, -55),
        (107.5, 1.5875, -55),
        (107.5, 1.5875, 55),
        (-107.5, 1.5875, 55),
    ]]
    fillet(fillet1_edges, radius=FILLET1_R)

    # Sketch7 → Cut-Extrude6 (cut, through all)
    with BuildSketch(Plane.XZ):
        Polygon((-87.4, -46.725), (-88.5, -46.725), (-101.5, -46.725), (-102.6, -46.725), (-102.6, -50.1), (-101.5, -50.1), (-88.5, -50.1), (-87.4, -50.1), align=None)
        Polygon((-101.5, -33.55), (-102.6, -33.55), (-102.6, -36.925), (-101.5, -36.925), (-88.5, -36.925), (-87.4, -36.925), (-87.4, -33.55), (-88.5, -33.55), align=None)
        Polygon((-87.4, 50.1), (-88.5, 50.1), (-101.5, 50.1), (-102.6, 50.1), (-102.6, 46.725), (-101.5, 46.725), (-88.5, 46.725), (-87.4, 46.725), align=None)
        Polygon((-101.5, 36.925), (-102.6, 36.925), (-102.6, 33.55), (-101.5, 33.55), (-88.5, 33.55), (-87.4, 33.55), (-87.4, 36.925), (-88.5, 36.925), align=None)
    extrude(amount=-CUT_EXTRUDE6_DEPTH, mode=Mode.SUBTRACT)


solid = part.part
